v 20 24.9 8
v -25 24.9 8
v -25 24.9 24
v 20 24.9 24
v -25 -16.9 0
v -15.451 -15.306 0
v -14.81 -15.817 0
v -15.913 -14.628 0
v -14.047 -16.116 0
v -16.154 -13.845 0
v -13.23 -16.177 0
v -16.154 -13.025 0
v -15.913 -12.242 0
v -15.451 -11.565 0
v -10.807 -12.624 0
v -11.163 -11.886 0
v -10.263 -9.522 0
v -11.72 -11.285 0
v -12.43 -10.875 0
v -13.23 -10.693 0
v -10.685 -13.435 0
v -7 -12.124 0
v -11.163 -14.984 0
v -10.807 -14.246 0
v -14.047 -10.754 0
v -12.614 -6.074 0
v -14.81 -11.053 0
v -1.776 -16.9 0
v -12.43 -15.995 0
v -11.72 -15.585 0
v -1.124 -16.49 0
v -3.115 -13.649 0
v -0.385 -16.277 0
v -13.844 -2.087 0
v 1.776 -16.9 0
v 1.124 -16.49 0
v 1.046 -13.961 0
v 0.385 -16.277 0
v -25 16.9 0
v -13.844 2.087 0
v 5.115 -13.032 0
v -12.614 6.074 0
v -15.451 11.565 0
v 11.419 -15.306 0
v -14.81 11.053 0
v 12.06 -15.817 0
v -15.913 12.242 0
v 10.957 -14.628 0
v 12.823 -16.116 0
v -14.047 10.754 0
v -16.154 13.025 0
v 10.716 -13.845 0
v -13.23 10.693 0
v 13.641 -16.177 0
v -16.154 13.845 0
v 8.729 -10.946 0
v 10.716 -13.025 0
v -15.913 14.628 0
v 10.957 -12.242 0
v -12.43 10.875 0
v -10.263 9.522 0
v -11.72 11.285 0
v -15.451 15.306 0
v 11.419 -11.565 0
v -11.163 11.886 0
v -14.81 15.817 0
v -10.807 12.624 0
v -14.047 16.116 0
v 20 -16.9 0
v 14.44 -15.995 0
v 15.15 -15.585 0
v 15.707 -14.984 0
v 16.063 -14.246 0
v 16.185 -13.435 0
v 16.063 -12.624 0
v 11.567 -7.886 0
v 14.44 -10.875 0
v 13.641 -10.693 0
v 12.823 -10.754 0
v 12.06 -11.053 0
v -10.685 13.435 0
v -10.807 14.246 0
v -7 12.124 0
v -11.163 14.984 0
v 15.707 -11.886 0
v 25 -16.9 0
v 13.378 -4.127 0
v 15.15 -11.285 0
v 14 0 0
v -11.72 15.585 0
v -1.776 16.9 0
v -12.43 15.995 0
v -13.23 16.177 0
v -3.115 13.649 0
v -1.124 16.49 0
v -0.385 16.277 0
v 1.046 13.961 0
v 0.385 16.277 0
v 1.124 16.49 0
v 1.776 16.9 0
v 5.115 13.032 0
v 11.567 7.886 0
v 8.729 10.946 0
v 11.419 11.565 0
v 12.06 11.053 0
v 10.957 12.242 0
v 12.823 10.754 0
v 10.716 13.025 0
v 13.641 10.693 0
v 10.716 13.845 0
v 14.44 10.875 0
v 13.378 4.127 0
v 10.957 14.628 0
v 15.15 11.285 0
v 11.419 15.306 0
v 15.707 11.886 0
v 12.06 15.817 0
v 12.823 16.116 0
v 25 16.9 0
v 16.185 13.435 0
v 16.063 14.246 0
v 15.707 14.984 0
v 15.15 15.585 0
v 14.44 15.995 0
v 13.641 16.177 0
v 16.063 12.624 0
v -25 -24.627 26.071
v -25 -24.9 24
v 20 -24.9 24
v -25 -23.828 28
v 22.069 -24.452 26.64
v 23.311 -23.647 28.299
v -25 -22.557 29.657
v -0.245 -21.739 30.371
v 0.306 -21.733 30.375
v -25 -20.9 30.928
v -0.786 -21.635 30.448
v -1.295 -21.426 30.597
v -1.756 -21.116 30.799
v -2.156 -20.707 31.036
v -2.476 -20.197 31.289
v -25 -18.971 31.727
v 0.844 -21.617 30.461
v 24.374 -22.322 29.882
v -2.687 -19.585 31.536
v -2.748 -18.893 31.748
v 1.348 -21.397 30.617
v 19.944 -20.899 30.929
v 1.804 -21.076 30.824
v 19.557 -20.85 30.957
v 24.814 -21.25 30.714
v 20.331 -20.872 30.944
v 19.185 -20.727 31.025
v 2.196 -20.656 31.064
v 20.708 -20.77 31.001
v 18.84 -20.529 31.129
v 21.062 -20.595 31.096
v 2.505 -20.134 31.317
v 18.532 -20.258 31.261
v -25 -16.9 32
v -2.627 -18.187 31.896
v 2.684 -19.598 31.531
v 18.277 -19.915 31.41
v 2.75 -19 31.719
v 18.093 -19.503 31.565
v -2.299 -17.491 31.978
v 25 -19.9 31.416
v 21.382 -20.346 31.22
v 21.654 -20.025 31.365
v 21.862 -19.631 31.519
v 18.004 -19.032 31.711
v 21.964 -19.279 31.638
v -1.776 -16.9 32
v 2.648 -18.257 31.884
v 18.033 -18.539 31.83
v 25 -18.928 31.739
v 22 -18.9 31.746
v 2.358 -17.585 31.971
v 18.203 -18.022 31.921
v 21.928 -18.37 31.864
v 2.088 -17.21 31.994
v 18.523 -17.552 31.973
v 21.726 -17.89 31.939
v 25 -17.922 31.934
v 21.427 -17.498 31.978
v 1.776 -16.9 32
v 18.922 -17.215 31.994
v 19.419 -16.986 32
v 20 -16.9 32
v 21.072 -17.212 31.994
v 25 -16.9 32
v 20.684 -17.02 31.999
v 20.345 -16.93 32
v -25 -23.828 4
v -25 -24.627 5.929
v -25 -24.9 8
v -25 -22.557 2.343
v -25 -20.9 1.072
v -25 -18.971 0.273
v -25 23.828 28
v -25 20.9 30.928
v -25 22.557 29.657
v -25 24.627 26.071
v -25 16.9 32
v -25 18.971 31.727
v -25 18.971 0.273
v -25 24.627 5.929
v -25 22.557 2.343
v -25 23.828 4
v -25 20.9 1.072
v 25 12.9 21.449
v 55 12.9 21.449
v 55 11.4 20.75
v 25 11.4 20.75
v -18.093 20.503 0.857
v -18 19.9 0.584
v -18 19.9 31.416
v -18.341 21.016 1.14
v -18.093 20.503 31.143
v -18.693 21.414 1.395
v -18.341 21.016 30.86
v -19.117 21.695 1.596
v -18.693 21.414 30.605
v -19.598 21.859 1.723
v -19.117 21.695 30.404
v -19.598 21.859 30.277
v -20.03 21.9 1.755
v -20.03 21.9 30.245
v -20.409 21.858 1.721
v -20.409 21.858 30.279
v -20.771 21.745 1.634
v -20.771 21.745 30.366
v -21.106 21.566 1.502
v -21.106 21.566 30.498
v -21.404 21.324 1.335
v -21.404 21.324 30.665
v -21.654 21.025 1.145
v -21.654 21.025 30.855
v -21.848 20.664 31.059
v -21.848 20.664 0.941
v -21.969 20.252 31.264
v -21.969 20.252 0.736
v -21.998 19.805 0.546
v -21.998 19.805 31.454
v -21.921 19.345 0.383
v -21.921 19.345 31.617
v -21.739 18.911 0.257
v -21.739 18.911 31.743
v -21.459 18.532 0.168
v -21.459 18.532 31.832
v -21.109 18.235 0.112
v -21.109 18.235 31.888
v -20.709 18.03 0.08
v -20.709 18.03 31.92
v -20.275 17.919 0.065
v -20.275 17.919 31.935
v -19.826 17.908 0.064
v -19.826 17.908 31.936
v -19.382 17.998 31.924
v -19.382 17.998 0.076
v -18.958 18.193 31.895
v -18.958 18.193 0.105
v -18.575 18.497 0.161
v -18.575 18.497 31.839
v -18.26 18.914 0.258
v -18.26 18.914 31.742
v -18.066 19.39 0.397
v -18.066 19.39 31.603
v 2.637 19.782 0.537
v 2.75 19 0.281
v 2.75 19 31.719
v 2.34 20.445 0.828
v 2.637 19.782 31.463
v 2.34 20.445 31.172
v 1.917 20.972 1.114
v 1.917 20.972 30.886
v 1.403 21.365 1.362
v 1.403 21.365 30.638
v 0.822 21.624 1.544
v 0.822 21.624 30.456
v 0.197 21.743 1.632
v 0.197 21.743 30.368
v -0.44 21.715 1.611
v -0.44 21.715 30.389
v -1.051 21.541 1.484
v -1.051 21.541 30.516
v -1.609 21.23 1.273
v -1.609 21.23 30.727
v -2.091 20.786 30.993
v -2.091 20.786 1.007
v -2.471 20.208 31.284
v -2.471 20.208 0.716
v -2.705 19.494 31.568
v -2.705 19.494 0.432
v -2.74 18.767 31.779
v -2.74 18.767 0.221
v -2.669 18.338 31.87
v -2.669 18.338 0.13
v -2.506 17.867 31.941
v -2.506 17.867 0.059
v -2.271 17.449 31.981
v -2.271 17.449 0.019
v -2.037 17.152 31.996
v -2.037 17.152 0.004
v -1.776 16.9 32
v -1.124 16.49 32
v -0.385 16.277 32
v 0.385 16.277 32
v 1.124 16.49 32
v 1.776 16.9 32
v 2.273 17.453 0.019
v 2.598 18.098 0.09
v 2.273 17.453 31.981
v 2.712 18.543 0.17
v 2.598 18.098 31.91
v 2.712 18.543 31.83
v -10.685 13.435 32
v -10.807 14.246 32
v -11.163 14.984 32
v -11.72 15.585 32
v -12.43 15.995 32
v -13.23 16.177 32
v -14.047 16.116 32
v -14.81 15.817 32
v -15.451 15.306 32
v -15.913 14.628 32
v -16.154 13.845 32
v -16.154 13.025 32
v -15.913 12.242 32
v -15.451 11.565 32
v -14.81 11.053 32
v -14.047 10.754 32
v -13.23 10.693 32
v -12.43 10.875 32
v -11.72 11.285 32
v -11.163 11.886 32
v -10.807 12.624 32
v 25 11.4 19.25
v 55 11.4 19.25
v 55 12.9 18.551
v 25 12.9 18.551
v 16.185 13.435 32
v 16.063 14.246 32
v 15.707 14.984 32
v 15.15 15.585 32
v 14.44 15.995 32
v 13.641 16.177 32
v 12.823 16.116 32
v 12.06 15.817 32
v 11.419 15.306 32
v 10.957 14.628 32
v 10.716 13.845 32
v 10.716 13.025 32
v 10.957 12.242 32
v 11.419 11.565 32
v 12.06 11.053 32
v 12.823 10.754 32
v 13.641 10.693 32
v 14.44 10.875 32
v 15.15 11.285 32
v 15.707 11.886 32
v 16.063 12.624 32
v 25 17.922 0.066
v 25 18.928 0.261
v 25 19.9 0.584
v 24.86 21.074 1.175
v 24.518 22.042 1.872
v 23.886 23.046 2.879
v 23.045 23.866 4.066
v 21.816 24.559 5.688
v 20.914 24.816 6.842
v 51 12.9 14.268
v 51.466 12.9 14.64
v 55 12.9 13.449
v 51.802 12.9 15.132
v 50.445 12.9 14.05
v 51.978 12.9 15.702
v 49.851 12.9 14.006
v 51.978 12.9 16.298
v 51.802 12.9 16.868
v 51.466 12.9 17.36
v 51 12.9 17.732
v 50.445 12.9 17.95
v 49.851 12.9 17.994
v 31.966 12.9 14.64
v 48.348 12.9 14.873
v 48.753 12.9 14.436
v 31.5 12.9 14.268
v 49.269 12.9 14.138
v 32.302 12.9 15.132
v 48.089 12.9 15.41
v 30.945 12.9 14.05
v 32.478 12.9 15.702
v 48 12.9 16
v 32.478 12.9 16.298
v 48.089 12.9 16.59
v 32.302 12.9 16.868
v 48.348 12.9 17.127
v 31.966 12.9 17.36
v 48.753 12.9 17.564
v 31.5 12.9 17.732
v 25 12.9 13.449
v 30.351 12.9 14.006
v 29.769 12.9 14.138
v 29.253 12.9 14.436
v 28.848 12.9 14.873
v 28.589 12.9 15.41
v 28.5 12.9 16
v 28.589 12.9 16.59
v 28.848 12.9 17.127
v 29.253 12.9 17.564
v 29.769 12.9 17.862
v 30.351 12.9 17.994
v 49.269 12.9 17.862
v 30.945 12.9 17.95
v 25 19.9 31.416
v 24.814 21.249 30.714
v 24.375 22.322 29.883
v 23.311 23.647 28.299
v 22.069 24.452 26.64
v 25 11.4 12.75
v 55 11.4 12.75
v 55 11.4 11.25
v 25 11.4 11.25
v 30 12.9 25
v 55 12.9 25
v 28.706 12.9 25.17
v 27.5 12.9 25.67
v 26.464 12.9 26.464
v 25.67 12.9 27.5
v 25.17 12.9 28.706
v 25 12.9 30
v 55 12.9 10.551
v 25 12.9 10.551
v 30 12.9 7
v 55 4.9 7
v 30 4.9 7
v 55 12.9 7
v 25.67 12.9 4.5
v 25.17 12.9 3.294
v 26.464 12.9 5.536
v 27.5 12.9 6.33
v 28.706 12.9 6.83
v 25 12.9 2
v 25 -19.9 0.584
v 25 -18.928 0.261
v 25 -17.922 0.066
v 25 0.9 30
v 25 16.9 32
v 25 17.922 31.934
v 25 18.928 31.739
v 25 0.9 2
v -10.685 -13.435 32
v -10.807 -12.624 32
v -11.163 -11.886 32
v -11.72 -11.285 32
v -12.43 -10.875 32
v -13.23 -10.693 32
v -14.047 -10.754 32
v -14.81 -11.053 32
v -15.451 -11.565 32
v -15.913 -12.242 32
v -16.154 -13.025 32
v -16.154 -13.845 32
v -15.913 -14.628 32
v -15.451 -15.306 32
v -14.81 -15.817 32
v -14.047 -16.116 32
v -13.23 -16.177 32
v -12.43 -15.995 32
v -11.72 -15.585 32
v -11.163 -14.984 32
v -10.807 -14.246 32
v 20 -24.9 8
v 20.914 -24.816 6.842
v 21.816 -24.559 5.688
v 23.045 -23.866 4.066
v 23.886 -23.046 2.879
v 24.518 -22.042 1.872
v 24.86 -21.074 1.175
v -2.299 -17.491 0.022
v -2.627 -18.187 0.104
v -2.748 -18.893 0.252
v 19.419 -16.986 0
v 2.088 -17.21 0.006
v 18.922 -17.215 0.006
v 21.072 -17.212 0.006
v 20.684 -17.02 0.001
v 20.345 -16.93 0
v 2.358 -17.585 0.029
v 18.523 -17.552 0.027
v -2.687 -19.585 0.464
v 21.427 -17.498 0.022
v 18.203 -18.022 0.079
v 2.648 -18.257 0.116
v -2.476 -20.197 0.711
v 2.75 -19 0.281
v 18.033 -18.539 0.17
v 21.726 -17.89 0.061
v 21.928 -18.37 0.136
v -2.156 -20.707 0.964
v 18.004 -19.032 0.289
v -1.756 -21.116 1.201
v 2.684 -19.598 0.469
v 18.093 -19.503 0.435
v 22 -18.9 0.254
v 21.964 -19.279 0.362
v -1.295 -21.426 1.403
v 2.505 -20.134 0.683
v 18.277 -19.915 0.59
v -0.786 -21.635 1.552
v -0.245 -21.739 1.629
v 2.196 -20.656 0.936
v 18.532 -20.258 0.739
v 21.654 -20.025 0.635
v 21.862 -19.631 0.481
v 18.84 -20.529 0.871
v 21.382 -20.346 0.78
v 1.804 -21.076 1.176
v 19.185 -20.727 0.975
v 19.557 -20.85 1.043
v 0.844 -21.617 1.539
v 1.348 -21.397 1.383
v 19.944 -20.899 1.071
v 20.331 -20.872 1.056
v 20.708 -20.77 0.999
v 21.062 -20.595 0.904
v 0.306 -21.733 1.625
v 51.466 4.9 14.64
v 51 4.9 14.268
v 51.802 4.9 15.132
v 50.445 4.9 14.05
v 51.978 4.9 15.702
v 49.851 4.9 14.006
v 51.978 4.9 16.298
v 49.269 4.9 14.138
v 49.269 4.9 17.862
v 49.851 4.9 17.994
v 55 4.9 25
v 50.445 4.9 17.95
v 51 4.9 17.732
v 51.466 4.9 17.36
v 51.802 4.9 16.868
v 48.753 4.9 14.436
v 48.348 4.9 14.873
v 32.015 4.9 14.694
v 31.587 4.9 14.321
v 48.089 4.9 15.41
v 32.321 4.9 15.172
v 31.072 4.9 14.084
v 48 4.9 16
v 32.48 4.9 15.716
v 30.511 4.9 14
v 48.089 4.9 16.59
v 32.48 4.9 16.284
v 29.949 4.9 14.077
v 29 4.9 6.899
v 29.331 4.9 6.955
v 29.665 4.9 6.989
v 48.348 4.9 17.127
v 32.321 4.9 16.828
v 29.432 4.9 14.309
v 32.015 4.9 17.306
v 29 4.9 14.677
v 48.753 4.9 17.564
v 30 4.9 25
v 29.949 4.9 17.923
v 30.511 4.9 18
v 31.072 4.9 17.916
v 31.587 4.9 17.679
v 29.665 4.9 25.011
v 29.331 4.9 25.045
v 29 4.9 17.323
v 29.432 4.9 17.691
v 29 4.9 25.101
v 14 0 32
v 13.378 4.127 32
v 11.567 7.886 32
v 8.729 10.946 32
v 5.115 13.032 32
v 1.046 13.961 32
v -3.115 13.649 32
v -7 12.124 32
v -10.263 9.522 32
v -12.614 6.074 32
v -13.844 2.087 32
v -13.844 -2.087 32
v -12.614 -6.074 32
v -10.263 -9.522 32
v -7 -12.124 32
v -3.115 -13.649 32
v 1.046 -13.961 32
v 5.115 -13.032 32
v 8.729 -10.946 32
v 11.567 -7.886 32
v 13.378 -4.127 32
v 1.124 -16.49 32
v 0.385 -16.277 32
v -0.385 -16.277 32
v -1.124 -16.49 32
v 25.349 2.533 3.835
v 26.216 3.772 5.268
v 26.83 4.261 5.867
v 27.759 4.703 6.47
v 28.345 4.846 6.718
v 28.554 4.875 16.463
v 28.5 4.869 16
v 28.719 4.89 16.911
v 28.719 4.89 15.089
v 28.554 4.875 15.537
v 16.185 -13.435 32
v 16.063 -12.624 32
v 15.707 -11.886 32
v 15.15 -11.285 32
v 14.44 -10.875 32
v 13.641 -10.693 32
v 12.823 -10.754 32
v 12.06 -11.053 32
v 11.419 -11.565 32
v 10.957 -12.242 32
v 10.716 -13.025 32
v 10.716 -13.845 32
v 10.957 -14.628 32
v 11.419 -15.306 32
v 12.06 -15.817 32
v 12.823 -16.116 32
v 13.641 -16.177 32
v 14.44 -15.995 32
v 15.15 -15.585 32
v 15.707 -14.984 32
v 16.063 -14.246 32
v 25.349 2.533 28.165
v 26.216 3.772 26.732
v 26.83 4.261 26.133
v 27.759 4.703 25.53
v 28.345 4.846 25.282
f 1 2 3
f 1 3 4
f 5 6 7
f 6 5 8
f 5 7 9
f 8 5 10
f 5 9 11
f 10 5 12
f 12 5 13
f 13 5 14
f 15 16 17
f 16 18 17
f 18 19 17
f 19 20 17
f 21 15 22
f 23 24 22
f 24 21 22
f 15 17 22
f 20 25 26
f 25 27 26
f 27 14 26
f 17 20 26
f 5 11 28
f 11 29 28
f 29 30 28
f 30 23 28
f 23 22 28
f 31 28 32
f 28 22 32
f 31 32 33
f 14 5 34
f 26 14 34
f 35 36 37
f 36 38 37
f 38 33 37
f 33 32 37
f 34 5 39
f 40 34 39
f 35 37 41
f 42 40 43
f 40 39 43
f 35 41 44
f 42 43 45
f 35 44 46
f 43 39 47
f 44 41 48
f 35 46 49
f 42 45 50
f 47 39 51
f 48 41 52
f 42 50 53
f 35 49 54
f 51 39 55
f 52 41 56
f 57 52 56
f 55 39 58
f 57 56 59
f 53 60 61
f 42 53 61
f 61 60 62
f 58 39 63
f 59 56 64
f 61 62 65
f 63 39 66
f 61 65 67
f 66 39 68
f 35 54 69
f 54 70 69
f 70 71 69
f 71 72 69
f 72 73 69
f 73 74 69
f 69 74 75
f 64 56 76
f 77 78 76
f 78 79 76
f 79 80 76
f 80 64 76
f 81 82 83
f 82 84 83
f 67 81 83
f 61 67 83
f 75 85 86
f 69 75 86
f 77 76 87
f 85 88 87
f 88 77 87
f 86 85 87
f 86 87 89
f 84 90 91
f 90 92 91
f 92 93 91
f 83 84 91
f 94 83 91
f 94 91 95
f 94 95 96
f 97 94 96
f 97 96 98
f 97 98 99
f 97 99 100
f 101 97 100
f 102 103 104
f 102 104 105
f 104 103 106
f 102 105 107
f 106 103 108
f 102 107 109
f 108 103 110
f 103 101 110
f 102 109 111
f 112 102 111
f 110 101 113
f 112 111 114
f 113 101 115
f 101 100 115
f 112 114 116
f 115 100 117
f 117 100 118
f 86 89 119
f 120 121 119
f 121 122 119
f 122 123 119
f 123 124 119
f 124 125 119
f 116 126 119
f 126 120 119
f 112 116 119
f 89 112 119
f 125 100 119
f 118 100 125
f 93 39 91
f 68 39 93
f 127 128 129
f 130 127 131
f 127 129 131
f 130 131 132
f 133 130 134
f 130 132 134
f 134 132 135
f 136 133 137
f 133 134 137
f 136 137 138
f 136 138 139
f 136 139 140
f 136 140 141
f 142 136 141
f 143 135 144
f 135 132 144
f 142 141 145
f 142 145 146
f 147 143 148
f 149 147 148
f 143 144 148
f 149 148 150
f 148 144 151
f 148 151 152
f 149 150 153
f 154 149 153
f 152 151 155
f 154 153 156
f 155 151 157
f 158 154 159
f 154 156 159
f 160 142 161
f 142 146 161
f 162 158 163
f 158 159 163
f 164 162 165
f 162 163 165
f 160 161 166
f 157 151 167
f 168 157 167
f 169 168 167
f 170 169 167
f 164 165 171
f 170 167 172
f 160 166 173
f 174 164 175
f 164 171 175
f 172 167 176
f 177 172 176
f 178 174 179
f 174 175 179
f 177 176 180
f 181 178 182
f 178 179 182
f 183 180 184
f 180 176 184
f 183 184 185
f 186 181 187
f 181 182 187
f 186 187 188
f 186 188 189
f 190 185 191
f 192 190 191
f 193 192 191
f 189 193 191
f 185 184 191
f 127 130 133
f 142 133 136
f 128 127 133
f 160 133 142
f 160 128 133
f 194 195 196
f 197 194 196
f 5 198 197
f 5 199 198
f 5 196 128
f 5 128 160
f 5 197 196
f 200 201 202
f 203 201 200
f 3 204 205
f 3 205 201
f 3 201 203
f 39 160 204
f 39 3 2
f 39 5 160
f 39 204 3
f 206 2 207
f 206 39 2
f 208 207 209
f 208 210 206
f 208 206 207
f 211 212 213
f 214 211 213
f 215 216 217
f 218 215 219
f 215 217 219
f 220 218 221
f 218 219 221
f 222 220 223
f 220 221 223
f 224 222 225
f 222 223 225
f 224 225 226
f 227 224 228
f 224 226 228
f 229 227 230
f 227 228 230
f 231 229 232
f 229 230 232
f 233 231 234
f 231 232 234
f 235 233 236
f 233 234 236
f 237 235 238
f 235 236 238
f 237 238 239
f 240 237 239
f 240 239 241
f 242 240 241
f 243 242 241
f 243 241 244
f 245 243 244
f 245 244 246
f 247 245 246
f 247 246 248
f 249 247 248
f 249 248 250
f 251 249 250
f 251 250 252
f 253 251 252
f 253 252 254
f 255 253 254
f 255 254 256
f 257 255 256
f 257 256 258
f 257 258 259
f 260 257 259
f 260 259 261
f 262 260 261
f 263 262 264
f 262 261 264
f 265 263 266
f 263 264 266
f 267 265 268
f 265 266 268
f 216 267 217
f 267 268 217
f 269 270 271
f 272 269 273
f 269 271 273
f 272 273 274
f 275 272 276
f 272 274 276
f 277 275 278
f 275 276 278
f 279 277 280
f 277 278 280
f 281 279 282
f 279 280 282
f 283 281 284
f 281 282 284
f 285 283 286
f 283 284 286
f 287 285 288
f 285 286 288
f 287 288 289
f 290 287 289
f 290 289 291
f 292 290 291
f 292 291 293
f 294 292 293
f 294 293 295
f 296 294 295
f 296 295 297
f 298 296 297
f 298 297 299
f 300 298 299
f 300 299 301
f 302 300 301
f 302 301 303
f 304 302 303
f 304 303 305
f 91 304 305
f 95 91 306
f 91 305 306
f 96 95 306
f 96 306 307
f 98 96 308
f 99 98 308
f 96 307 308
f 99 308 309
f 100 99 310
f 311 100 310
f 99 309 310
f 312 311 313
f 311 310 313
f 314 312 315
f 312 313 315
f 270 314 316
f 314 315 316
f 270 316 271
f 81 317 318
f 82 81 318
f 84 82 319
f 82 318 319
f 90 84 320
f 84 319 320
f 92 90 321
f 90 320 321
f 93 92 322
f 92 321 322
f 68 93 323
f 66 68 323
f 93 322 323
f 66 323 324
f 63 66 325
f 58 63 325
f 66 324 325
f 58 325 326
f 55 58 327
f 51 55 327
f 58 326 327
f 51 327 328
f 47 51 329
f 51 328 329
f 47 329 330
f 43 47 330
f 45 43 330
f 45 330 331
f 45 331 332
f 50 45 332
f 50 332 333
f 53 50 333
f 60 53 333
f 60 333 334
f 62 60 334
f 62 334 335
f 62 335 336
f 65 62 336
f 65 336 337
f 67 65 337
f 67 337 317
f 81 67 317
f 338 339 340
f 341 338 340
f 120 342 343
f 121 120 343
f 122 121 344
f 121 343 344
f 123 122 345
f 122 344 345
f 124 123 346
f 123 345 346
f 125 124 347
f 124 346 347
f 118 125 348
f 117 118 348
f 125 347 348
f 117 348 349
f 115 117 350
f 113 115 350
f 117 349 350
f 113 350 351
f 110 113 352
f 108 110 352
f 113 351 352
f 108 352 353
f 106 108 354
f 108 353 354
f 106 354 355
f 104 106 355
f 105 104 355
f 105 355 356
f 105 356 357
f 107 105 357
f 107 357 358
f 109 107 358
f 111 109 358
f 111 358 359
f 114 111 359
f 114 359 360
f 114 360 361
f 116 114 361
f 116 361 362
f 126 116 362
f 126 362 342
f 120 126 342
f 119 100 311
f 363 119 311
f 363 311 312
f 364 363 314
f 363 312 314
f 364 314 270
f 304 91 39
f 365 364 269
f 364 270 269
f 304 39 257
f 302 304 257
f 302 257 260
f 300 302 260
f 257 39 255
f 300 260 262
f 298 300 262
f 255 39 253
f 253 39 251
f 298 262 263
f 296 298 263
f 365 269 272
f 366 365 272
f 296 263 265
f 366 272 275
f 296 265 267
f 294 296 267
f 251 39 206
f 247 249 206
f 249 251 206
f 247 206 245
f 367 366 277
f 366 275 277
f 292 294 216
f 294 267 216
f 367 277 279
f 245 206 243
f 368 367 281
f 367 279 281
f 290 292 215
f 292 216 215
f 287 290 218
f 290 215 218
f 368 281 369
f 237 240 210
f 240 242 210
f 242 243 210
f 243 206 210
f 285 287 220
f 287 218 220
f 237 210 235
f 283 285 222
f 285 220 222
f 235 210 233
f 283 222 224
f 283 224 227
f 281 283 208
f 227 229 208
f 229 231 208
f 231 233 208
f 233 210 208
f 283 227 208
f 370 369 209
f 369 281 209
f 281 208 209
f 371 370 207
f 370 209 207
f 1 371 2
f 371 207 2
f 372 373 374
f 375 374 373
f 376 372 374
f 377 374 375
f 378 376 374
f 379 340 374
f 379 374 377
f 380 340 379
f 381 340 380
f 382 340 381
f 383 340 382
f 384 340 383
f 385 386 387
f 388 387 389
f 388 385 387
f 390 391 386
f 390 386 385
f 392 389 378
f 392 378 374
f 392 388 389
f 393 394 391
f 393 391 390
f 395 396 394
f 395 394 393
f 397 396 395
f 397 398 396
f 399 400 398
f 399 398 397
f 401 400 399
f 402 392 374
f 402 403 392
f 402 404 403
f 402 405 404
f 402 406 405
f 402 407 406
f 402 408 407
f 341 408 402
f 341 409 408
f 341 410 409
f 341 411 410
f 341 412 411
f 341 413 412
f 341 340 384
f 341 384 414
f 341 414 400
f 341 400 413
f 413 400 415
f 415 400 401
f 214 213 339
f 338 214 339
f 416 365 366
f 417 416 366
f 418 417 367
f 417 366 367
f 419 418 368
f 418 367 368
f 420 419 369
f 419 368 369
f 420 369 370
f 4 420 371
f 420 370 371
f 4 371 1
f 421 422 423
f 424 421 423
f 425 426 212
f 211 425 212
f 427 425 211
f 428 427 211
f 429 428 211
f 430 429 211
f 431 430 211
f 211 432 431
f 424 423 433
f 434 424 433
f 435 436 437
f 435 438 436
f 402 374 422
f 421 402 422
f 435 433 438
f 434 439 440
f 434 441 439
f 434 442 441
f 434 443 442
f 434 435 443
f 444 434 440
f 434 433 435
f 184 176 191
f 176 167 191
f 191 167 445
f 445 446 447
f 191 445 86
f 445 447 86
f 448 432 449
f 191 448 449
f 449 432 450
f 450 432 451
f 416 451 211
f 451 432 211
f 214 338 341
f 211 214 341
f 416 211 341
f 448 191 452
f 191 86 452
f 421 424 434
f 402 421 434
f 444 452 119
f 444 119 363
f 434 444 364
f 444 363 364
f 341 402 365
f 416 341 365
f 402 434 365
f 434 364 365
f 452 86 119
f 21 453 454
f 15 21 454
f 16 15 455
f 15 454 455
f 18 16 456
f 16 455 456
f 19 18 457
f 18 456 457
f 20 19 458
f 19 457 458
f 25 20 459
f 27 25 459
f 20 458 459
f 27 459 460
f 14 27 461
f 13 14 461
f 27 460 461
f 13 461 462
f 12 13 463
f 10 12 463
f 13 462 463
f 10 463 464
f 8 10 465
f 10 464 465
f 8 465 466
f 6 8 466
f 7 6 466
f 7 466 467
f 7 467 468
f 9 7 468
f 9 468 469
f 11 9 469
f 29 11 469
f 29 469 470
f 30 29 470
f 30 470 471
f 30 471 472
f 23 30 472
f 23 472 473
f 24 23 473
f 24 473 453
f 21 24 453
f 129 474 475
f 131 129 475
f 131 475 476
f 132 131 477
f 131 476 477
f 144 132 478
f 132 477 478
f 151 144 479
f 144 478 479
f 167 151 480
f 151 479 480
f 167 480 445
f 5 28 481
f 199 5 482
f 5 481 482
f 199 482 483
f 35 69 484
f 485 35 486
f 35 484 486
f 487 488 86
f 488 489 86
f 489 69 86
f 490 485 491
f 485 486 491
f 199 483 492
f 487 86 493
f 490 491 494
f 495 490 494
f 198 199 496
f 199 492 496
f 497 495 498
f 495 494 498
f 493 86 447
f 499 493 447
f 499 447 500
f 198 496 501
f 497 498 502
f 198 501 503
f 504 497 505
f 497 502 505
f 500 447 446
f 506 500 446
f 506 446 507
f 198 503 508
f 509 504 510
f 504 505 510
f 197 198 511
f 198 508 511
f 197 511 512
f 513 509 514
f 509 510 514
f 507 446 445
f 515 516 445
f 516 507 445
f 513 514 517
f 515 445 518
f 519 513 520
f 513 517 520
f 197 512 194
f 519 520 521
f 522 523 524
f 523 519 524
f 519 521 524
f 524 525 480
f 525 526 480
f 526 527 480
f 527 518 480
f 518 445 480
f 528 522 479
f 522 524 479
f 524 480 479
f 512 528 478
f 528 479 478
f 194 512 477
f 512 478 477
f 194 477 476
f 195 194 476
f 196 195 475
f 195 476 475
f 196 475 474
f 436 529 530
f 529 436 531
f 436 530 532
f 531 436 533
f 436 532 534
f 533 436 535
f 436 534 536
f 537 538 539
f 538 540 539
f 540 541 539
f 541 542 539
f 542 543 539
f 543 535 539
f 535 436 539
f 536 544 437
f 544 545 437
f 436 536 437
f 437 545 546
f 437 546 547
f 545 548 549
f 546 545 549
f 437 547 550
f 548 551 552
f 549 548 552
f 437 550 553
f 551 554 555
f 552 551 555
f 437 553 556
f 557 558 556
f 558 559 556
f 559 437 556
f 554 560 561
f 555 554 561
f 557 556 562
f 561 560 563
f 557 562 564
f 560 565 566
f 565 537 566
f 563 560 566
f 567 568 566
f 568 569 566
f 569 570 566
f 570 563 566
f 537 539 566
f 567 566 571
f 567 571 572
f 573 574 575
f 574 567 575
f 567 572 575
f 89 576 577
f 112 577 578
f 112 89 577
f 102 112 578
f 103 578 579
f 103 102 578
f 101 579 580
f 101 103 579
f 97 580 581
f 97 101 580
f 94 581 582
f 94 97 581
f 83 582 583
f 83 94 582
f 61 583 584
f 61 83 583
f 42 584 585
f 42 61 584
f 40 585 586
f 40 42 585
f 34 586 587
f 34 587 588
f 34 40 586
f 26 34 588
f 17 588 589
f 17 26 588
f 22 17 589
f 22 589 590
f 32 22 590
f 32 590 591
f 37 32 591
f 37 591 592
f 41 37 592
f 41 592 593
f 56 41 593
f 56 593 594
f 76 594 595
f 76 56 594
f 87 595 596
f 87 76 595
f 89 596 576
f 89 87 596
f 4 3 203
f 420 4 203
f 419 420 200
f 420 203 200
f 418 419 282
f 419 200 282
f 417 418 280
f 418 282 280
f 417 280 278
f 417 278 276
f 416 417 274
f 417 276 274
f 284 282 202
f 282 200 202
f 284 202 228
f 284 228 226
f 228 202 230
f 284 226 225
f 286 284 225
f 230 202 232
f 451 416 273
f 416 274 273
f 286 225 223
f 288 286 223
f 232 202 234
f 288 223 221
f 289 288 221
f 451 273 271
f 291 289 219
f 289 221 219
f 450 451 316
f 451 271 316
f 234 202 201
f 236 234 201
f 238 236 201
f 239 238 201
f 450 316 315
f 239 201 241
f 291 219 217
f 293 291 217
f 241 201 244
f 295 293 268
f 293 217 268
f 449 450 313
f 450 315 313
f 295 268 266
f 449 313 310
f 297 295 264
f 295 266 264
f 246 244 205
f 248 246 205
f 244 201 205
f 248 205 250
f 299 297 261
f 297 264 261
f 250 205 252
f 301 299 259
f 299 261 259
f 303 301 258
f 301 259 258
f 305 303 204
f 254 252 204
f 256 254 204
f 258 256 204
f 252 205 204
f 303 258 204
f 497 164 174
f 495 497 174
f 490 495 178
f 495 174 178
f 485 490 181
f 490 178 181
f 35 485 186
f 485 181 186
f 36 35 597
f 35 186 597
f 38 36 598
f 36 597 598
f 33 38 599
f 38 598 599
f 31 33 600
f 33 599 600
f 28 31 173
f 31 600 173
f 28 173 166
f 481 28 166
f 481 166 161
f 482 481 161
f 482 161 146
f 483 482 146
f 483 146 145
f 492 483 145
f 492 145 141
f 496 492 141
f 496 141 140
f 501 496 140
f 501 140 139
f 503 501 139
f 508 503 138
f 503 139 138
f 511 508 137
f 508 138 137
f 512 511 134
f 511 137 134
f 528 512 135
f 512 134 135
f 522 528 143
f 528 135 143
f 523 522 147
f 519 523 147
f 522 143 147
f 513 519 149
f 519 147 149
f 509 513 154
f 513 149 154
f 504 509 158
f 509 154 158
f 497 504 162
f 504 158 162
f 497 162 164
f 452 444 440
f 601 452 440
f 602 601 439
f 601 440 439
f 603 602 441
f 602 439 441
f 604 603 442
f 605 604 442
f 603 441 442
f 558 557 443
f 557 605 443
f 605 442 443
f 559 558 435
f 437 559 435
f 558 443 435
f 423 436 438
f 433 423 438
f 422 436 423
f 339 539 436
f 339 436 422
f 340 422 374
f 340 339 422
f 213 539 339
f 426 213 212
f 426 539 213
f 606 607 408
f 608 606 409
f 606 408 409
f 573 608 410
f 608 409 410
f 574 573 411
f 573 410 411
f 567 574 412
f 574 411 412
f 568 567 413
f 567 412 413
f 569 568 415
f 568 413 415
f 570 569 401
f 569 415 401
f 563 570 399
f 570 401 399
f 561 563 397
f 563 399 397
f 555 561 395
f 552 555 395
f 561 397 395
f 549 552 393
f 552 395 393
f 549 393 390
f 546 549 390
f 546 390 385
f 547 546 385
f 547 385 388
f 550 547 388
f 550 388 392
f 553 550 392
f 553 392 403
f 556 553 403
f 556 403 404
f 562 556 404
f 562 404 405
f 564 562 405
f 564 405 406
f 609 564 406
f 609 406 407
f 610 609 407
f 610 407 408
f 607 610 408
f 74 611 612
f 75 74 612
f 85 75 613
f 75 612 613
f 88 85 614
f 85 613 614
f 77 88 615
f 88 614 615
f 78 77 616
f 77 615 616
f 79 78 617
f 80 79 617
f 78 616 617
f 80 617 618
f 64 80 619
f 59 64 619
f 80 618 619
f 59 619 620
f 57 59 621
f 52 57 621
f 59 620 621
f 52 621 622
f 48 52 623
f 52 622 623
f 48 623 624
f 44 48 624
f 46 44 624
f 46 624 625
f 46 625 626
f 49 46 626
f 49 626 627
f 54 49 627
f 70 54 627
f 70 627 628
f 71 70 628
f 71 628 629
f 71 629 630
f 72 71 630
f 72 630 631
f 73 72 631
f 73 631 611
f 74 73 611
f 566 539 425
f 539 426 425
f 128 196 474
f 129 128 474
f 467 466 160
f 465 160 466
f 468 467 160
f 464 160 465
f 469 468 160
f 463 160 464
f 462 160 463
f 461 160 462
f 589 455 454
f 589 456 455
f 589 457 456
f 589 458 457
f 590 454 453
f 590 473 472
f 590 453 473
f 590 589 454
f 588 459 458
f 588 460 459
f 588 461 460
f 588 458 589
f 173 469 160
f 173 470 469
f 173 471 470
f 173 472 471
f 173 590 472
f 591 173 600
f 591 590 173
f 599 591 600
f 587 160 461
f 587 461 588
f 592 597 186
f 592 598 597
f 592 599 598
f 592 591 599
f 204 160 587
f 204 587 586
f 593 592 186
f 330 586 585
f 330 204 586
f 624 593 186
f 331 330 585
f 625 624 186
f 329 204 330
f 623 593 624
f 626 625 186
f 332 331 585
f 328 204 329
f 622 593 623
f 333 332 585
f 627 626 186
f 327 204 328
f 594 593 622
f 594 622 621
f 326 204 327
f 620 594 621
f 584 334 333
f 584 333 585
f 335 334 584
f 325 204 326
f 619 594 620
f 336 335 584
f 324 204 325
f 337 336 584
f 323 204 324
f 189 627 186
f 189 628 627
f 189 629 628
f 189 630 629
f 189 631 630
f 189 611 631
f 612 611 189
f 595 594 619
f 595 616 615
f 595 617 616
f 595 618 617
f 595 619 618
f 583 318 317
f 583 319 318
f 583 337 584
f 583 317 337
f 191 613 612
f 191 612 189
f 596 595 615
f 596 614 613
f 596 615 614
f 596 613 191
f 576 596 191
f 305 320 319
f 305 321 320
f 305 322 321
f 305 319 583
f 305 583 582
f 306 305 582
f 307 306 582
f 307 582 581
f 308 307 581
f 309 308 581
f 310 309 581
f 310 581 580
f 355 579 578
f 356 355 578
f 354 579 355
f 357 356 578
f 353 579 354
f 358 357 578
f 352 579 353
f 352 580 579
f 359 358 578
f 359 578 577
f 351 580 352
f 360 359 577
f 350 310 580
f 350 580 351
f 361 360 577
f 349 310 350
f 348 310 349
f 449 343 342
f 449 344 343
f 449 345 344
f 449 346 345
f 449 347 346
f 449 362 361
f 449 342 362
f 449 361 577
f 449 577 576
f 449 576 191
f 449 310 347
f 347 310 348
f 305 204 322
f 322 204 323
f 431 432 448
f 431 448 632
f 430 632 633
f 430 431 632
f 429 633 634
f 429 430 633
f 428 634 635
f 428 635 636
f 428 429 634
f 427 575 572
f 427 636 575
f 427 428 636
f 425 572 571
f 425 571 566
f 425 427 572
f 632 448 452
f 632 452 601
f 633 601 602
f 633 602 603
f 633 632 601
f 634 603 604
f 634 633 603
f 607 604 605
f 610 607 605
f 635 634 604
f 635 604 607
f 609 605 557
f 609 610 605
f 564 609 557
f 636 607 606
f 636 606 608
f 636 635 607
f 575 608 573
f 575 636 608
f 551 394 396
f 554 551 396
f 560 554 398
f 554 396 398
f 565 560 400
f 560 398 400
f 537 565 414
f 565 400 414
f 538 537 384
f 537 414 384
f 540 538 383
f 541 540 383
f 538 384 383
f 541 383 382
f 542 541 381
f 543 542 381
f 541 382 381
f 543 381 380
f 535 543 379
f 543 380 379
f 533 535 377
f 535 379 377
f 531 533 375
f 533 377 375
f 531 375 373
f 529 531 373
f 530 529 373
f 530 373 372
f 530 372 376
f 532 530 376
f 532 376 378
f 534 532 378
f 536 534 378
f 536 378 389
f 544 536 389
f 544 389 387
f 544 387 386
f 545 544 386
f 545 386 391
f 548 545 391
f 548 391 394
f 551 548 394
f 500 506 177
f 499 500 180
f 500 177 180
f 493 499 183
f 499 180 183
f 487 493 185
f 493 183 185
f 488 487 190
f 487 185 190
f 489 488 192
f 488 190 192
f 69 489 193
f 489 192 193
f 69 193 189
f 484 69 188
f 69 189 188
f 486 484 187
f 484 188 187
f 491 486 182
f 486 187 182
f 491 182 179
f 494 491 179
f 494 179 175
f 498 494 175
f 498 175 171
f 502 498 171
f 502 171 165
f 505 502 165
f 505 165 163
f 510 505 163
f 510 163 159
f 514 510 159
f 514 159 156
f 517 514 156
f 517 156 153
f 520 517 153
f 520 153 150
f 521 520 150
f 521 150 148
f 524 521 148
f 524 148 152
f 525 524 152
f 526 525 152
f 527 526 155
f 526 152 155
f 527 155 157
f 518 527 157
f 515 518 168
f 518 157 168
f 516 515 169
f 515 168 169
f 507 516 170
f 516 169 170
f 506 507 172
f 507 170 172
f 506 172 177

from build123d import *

# Parameters (mm, degrees)
SKETCH1_W           = 50
SKETCH1_H           = 49.8
SKETCH1_R           = 14
BOSS_EXTRUDE1_DEPTH = 32
SKETCH5_R           = 2
CUT_EXTRUDE2_DEPTH  = 48.634126422
SKETCH12_W          = 30
SKETCH12_H          = 8
BOSS_EXTRUDE3_DEPTH = 18
CUT_EXTRUDE3_DEPTH  = 30
FILLET5_R           = 5
FILLET6_R           = 5
FILLET8_R           = 4
SKETCH14_R          = 2
CUT_EXTRUDE4_DEPTH  = 10
SKETCH16_R          = 2.75
CUT_EXTRUDE5_DEPTH  = 69.330154398
FILLET10_R          = 8
FILLET11_R          = 5


with BuildPart() as part:
    # Sketch1 → Boss-Extrude1 (new body)
    with BuildSketch(Plane.XY):
        Rectangle(SKETCH1_W, SKETCH1_H)
        Circle(SKETCH1_R, mode=Mode.SUBTRACT)
    extrude(amount=BOSS_EXTRUDE1_DEPTH)

    # Sketch5 → Cut-Extrude2 (cut, through all)
    with BuildSketch(Plane.XY.offset(32)):
        with Locations((20, -18.9)):
            Circle(SKETCH5_R)
        with Locations((-20, 19.9)):
            Circle(SKETCH5_R)
    extrude(amount=-CUT_EXTRUDE2_DEPTH, mode=Mode.SUBTRACT)

    # Sketch12 → Boss-Extrude3 (add)
    with BuildSketch(Plane(origin=(0, 0, 25), x_dir=(-1, 0, 0), z_dir=(0, 0, -1))):
        with Locations((-40, 8.9)):
            Rectangle(SKETCH12_W, SKETCH12_H)
    extrude(amount=BOSS_EXTRUDE3_DEPTH)

    # Sketch13 → Cut-Extrude3 (cut)
    with BuildSketch(Plane(origin=(55, 0, 0), x_dir=(0, 0, -1), z_dir=(1, 0, 0))):
        Polygon((-18.550538513, 12.9), (-21.449461487, 12.9), (-20.75, 11.4), (-19.25, 11.4), align=None)
        Polygon((-10.550538513, 12.9), (-13.449461487, 12.9), (-12.75, 11.4), (-11.25, 11.4), align=None)
    extrude(amount=-CUT_EXTRUDE3_DEPTH, mode=Mode.SUBTRACT)

    # Fillet5
    fillet5_edges = [part.edges().sort_by_distance(p)[0] for p in [
        (25, 8.9, 25),
    ]]
    fillet(fillet5_edges, radius=FILLET5_R)

    # Fillet6
    fillet6_edges = [part.edges().sort_by_distance(p)[0] for p in [
        (25, 8.9, 7),
    ]]
    fillet(fillet6_edges, radius=FILLET6_R)

    # Fillet8
    fillet8_edges = [part.edges().sort_by_distance(p)[0] for p in [
        (25, 4.9, 16),
    ]]
    fillet(fillet8_edges, radius=FILLET8_R)

    # Sketch14 → Cut-Extrude4 (cut)
    with BuildSketch(Plane(origin=(0, 12.9, 0), x_dir=(1, 0, 0), z_dir=(0, 1, 0))):
        with Locations(Location((50, -16, 0), (0, 0, 180))):
            Circle(SKETCH14_R)
        with Locations(Location((30.5, -16, 0), (0, 0, 180))):
            Circle(SKETCH14_R)
    extrude(amount=-CUT_EXTRUDE4_DEPTH, mode=Mode.SUBTRACT)

    # Sketch16 → Cut-Extrude5 (cut, through all)
    with BuildSketch(Plane.XY.offset(32)):
        with Locations((0, 19)):
            Circle(SKETCH16_R)
        with Locations((13.435028843, 13.435028843)):
            Circle(SKETCH16_R)
        with Locations((13.435028843, -13.435028843)):
            Circle(SKETCH16_R)
        with Locations((0, -19)):
            Circle(SKETCH16_R)
        with Locations((-13.435028843, -13.435028843)):
            Circle(SKETCH16_R)
        with Locations((-13.435028843, 13.435028843)):
            Circle(SKETCH16_R)
    extrude(amount=-CUT_EXTRUDE5_DEPTH, mode=Mode.SUBTRACT)

    # Fillet10
    # the kernel refuses this fillet: 8 mm, written as the material it takes off along each edge
    with BuildSketch(Plane(origin=(45, -24.9, 32), x_dir=(0, 1, 0), z_dir=(-1, 0, 0)), Plane(origin=(45, -24.9, 0), x_dir=(0, 0, 1), z_dir=(-1, 0, 0)), Plane(origin=(-45, 24.9, 0), x_dir=(0, 0, 1), z_dir=(1, 0, 0))) as fillet10_piece_1:
        with BuildLine():
            CenterArc((FILLET10_R, FILLET10_R), FILLET10_R, 180, 90)
            Line((0, FILLET10_R), (0, 0))
            Line((0, 0), (FILLET10_R, 0))
        make_face()
    extrude(amount=90, mode=Mode.SUBTRACT)
    with BuildSketch(Plane(origin=(-45, 24.9, 32), x_dir=(0, 0, -1), z_dir=(1, 0, 0))) as fillet10_piece_2:
        with BuildLine():
            CenterArc((FILLET10_R, -FILLET10_R), FILLET10_R, 90, 90)
            Line((0, -FILLET10_R), (0, 0))
            Line((0, 0), (FILLET10_R, 0))
        make_face()
    extrude(amount=90, mode=Mode.SUBTRACT)

    # Fillet11
    # the kernel refuses this fillet: 5 mm, written as the material it takes off along each edge
    with BuildSketch(Plane(origin=(25, -24.9, -4.5), x_dir=(0, 1, 0), z_dir=(0, 0, 1))) as fillet11_piece_1:
        with BuildLine():
            CenterArc((FILLET11_R, FILLET11_R), FILLET11_R, 180, 90)
            Line((0, FILLET11_R), (0, 0))
            Line((0, 0), (FILLET11_R, 0))
        make_face()
    extrude(amount=41, mode=Mode.SUBTRACT)
    with BuildSketch(Plane(origin=(25, 24.9, -4.5), x_dir=(0, -1, 0), z_dir=(0, 0, 1))) as fillet11_piece_2:
        with BuildLine():
            CenterArc((FILLET11_R, -FILLET11_R), FILLET11_R, 90, 90)
            Line((0, -FILLET11_R), (0, 0))
            Line((0, 0), (FILLET11_R, 0))
        make_face()
    extrude(amount=41, mode=Mode.SUBTRACT)


solid = part.part
